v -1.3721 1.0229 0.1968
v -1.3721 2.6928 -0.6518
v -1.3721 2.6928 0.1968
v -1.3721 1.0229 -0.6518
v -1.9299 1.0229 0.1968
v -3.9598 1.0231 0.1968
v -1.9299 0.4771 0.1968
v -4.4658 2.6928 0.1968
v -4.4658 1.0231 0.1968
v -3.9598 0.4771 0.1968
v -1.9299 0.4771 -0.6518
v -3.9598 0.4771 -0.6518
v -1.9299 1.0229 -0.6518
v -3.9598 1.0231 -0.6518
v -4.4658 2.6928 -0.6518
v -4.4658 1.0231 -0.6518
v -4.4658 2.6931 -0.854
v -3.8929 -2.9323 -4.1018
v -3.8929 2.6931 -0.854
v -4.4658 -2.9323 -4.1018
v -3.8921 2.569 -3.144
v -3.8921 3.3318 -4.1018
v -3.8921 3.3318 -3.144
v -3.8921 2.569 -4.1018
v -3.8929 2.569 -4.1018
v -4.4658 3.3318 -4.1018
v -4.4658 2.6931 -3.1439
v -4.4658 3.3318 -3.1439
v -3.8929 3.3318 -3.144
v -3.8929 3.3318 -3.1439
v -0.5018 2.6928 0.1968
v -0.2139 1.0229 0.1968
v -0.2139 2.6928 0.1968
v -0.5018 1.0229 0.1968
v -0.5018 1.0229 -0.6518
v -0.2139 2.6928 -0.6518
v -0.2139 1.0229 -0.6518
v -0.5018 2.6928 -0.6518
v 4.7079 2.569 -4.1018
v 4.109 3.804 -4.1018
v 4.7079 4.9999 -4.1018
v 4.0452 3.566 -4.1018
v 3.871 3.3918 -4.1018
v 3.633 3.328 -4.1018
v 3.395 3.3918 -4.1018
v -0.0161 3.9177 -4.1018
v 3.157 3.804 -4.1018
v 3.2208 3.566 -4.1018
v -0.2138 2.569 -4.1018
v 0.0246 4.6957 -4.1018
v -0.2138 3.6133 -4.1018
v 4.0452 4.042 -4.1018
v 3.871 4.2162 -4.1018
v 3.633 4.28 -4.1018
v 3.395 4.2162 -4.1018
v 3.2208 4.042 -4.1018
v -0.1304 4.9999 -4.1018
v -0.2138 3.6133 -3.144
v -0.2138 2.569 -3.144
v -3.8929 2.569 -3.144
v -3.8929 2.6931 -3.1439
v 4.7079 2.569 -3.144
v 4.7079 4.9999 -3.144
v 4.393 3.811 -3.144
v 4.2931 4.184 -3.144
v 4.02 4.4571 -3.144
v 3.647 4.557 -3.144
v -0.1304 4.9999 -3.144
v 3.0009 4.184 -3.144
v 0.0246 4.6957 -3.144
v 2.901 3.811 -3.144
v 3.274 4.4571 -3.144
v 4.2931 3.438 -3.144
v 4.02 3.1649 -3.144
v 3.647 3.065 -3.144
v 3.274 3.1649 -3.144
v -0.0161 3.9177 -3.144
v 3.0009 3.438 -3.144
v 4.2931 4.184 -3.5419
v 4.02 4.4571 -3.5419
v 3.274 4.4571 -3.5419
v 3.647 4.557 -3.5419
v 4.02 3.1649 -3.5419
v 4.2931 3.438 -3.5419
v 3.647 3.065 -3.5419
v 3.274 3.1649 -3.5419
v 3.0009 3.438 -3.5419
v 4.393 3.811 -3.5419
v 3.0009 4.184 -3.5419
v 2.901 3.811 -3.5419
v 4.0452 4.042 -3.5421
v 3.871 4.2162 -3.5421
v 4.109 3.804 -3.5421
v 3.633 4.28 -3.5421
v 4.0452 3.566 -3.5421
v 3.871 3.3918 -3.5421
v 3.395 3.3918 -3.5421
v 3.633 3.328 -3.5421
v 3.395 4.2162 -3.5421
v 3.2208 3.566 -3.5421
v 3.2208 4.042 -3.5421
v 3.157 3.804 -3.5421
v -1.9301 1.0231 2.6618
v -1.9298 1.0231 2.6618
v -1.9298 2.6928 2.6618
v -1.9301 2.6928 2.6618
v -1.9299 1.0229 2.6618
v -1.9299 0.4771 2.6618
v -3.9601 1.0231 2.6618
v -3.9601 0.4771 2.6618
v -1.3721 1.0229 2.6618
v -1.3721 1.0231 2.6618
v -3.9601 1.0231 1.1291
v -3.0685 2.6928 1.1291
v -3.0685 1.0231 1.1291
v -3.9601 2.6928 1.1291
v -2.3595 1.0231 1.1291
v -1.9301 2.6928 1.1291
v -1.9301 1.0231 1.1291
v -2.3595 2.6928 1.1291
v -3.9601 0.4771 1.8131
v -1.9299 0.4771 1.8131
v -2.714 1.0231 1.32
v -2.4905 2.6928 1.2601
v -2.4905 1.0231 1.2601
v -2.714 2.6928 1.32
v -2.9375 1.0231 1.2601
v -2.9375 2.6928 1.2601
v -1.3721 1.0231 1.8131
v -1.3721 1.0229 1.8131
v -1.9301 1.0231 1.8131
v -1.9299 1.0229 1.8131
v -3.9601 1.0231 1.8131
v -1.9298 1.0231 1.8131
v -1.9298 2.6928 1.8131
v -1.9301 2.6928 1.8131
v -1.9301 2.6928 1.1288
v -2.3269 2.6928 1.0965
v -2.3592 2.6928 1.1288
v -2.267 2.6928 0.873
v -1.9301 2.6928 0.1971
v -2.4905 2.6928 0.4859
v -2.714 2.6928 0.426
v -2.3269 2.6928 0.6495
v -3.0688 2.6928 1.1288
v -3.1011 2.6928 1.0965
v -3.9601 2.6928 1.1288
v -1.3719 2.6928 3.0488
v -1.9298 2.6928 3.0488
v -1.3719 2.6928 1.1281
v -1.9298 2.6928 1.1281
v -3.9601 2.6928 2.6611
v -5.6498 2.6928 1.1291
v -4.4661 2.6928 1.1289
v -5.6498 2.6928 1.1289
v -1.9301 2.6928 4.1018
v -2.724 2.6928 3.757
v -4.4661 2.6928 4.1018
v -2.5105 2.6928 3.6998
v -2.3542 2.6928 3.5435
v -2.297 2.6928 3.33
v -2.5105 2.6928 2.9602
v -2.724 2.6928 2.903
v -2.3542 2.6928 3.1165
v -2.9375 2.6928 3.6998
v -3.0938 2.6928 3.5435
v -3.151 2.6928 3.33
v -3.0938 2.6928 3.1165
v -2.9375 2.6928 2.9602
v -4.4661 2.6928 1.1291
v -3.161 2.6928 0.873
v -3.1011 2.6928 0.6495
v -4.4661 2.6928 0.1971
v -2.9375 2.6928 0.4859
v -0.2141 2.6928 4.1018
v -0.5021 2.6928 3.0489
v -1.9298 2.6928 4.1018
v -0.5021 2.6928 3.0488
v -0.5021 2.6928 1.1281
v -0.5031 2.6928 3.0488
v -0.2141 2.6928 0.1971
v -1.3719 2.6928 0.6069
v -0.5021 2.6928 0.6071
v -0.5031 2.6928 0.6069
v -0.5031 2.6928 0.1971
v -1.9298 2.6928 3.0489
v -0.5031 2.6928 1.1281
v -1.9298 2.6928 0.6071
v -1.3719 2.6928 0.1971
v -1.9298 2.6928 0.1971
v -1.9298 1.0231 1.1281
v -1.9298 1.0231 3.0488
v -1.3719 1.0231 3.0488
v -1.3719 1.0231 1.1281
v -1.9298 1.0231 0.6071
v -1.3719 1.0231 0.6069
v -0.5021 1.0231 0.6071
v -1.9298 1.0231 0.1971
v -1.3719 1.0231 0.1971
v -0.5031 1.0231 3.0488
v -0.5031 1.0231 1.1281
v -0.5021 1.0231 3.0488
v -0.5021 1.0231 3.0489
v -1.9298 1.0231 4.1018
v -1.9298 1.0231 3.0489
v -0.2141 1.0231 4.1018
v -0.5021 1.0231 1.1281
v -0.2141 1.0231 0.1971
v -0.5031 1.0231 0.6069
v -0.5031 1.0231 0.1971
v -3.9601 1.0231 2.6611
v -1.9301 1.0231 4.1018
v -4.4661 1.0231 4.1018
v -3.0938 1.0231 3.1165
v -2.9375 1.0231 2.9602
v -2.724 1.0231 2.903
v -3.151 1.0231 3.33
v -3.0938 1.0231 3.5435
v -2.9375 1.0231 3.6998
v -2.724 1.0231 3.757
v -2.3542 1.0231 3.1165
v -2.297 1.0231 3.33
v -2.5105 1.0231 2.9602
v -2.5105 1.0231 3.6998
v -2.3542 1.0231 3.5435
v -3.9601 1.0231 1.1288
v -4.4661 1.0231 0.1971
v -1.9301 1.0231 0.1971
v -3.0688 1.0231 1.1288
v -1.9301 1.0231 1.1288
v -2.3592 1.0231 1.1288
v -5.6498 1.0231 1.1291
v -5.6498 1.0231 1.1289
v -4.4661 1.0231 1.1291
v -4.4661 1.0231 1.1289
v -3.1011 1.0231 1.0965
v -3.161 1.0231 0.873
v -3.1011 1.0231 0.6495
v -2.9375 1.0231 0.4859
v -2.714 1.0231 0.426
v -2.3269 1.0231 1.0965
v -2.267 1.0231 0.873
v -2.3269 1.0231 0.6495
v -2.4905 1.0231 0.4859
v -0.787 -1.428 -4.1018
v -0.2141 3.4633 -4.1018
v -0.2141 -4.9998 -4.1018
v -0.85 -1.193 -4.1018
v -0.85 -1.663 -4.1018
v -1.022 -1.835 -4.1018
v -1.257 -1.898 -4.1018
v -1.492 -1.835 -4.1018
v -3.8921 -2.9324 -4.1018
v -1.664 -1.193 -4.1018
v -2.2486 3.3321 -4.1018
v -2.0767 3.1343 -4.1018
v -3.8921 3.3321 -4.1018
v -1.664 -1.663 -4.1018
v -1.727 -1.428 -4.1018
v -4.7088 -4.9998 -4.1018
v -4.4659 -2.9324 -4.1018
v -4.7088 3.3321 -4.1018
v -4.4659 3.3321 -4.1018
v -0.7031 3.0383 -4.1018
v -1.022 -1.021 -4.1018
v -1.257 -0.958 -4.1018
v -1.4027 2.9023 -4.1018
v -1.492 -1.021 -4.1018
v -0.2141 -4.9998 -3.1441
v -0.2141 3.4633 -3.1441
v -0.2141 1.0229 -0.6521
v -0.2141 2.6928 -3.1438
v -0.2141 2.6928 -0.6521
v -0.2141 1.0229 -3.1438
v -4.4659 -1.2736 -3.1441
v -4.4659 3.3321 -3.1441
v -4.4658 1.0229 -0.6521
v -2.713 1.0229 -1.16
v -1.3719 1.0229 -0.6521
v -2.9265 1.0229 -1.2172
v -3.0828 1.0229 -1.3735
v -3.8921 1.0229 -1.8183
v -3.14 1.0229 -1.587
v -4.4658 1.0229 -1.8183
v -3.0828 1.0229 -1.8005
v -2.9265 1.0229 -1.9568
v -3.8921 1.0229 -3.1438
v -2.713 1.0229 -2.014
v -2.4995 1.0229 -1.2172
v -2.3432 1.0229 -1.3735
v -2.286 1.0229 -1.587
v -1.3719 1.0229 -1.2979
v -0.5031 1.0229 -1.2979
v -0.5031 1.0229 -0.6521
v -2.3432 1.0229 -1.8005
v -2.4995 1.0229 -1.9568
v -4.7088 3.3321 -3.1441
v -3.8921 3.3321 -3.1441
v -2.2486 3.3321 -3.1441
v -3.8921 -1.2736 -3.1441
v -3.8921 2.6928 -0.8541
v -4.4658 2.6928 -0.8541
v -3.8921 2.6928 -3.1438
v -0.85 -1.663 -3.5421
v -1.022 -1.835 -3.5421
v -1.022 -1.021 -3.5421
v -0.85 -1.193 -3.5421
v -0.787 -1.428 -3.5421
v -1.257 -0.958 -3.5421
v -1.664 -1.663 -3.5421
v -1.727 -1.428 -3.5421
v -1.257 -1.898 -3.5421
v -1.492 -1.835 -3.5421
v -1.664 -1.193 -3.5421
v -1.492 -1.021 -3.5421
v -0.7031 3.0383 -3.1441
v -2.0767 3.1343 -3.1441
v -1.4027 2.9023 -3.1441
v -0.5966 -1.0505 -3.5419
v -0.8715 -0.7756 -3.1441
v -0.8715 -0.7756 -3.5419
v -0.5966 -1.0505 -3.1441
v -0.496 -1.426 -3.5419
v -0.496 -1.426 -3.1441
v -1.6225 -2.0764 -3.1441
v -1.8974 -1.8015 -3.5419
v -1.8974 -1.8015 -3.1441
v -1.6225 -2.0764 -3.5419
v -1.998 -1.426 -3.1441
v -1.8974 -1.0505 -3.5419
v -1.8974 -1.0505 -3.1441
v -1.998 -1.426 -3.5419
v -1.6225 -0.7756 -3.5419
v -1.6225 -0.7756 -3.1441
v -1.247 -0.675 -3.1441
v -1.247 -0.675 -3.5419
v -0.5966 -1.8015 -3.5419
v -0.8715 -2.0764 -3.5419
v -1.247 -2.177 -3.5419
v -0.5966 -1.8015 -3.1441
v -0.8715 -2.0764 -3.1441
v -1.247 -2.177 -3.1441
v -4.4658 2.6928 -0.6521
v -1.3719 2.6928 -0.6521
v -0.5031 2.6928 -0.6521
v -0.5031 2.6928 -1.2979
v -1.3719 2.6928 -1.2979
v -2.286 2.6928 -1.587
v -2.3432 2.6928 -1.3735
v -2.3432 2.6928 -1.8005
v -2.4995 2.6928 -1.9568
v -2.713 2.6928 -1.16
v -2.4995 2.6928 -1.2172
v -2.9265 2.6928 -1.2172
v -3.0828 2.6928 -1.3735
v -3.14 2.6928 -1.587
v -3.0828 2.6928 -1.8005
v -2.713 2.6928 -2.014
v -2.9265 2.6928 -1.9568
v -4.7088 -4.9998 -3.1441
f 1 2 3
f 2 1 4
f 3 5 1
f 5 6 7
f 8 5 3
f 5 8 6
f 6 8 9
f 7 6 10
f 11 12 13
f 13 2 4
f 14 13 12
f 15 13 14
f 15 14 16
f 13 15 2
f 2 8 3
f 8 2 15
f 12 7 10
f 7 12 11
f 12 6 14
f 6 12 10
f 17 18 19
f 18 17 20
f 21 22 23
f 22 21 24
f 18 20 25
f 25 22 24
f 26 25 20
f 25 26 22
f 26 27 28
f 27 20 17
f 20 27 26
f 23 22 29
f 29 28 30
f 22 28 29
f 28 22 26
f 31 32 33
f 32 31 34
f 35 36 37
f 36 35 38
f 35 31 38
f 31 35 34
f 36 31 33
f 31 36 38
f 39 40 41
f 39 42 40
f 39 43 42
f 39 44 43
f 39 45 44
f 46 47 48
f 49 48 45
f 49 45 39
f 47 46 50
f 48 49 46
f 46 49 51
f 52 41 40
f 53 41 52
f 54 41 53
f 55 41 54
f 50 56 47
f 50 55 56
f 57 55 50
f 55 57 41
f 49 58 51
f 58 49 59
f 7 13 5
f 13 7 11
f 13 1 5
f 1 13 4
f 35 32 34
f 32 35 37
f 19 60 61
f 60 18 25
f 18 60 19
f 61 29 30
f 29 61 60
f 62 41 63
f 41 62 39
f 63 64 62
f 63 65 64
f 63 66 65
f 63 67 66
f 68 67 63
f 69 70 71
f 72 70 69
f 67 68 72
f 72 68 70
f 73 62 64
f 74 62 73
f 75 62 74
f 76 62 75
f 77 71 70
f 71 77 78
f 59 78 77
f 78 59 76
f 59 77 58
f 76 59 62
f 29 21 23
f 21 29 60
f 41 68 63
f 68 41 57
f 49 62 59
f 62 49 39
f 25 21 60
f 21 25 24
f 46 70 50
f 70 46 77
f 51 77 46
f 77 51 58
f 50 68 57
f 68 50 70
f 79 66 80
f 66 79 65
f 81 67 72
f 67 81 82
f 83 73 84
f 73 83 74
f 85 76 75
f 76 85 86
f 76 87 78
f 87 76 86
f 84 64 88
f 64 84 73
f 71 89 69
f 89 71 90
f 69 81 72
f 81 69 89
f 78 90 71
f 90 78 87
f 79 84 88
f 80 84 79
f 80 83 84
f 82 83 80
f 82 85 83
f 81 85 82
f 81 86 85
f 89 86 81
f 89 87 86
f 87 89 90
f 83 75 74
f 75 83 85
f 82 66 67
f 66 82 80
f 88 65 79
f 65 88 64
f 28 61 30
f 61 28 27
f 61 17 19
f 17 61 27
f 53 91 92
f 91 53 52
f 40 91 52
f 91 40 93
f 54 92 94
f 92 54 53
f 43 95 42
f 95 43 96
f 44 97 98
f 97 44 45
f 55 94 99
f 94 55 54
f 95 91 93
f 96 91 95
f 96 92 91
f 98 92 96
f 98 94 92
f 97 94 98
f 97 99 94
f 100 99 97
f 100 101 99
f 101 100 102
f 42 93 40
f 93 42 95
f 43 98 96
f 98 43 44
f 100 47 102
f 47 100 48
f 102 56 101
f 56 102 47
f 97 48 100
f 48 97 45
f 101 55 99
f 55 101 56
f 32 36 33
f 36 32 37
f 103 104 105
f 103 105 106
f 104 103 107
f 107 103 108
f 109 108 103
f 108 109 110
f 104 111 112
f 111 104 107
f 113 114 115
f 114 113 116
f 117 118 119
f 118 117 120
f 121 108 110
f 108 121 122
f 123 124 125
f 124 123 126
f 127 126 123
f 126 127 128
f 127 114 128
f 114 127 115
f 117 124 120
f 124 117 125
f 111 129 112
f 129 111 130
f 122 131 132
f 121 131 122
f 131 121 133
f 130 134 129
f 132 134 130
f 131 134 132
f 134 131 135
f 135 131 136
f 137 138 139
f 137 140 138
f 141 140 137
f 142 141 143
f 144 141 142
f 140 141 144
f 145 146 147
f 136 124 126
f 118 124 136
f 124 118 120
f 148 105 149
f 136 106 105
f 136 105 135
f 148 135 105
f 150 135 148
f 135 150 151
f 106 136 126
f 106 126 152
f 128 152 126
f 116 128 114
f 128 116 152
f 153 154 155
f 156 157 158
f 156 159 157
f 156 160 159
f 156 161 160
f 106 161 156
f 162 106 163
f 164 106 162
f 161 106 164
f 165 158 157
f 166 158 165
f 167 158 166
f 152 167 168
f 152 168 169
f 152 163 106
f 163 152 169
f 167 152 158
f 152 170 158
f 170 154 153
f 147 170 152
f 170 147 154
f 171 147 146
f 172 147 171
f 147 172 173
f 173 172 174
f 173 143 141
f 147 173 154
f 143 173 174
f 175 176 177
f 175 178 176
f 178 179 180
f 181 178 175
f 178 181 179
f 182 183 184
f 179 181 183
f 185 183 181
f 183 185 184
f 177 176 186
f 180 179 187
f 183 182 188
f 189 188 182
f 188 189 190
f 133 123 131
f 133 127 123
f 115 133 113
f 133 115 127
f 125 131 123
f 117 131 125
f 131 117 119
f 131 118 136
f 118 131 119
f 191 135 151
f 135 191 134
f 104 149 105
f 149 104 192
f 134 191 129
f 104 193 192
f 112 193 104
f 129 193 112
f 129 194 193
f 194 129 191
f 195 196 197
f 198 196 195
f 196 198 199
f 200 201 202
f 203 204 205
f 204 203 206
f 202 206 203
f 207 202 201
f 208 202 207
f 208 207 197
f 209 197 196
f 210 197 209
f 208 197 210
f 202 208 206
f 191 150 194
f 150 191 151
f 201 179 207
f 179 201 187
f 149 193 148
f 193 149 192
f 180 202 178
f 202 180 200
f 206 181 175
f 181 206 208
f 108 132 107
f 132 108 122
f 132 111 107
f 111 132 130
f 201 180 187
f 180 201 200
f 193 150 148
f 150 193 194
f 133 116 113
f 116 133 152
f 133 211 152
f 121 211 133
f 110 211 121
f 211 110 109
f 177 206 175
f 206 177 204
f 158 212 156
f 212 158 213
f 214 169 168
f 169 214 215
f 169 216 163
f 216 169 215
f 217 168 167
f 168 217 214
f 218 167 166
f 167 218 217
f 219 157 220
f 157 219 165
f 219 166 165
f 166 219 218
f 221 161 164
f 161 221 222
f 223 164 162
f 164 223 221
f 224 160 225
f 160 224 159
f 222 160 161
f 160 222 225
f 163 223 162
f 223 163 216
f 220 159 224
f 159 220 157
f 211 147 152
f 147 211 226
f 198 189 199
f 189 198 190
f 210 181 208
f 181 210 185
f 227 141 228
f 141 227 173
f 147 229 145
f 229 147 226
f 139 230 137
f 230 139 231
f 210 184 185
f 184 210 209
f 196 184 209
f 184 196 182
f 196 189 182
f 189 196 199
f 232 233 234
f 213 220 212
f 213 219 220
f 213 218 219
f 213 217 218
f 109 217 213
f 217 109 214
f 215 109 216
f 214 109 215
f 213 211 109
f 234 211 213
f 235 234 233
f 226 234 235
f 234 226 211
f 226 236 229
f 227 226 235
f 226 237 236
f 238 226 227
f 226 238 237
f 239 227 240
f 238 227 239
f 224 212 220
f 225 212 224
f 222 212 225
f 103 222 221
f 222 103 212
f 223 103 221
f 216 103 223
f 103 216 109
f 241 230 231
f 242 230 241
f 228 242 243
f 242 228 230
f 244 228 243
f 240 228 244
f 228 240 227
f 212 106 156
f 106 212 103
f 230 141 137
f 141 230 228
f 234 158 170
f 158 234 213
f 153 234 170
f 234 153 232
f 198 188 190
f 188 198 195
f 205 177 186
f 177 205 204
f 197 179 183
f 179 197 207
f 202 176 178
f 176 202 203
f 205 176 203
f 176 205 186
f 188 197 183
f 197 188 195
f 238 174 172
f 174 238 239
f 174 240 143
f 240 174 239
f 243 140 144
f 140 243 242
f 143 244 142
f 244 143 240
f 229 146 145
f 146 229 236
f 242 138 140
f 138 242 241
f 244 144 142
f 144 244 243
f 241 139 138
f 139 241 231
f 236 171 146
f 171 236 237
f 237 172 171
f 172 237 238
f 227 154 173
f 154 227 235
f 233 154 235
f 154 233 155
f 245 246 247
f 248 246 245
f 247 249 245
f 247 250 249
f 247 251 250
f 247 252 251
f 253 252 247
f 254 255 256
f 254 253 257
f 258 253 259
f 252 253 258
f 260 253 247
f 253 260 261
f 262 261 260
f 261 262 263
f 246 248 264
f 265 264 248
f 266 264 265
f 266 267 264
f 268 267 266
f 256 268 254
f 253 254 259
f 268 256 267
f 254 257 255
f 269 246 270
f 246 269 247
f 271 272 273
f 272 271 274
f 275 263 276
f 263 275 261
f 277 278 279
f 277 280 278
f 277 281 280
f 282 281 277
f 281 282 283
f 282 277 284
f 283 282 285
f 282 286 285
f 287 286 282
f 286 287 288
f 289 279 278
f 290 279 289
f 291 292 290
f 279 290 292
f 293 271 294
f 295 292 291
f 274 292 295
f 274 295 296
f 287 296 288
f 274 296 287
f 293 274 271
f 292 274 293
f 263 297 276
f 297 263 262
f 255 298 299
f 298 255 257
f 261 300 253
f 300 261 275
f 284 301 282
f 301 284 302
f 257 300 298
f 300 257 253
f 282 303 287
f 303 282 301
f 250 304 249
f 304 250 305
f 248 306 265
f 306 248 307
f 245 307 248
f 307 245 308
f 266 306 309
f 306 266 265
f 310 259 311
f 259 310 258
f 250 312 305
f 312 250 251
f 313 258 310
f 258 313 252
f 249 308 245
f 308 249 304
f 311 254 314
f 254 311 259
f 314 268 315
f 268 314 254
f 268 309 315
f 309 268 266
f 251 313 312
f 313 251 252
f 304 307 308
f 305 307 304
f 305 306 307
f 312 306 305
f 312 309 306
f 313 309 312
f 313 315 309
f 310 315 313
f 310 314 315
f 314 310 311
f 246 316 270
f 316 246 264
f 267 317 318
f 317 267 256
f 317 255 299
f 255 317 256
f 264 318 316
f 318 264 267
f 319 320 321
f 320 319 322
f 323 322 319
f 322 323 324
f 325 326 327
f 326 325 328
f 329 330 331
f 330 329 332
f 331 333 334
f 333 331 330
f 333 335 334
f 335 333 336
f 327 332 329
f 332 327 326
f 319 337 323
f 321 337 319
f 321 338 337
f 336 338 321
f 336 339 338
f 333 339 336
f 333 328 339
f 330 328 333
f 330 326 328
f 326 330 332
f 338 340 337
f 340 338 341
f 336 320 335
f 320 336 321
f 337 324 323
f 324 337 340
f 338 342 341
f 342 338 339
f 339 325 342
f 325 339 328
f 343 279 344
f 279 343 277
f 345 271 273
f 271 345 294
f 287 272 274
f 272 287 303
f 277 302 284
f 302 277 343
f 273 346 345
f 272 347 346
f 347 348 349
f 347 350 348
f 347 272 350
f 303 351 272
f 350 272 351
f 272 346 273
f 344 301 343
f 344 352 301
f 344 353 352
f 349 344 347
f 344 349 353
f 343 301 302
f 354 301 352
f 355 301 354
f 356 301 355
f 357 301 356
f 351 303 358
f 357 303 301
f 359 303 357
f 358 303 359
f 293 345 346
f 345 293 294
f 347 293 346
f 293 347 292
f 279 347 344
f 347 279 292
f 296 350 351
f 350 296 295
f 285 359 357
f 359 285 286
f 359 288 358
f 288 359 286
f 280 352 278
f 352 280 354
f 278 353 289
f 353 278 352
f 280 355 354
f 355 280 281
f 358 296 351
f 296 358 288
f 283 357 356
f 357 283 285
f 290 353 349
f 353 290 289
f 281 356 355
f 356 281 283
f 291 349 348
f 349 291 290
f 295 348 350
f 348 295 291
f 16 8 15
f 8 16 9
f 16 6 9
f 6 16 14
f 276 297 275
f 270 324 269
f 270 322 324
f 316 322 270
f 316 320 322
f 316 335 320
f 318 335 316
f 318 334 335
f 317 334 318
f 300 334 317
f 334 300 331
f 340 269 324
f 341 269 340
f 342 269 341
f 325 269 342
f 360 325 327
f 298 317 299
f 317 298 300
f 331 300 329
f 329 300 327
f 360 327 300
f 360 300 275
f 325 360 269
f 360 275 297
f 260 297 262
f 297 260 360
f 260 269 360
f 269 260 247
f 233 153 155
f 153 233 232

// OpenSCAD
intersection() {
  translate([0.0005, 0, 0])
  cube(size = [11.3007, 11.9997, 9.8457], center = true);

  union() {
    difference() {
      union() {
        translate([2.1035, -1.1535, -0.2275])
        cube(size = [5.2107, 7.6927, 0.8487], center = true);
      
        intersection() {
          translate([-9.786, 1.585, -0.2275])
          cube(size = [16.8277, 2.2157, 0.8487], center = true);
        
          translate([7.12, 0, 0])
          rotate([90, 0, 0])
          cube(size = [22.1597, 36.3997, 36.3997], center = true);
        }
      
        translate([8.993, 0, -2.7])
        rotate([-180, 0, 0])
        cube(size = [18.4137, 36.3997, 2.8037], center = true);
      
        intersection() {
          translate([-9.207, 5.0715, -8.7841])
          rotate([-150, 0, 0])
          cube(size = [17.9857, 36.3997, 16.1137], center = true);
        
          translate([-4.179, -0.834, -2.377])
          cube(size = [0.5737, 8.3317, 3.4497], center = true);
        }
      
        translate([-1.247, -1.426, -11.151])
        cylinder(h = 14.0977, r1 = 0.751, r2 = 0.751, center = true, $fn = 12);
      }
    
      union() {
        translate([3.647, 3.811, 7.329])
        rotate([180, 0, 180])
        cylinder(h = 21.7418, r1 = 0.746, r2 = 0.746, center = true, $fn = 12);
      
        translate([6.867, 3.0125, -1.898])
        cube(size = [22.6658, 0.6388, 2.4918], center = true);
      
        translate([3.633, 3.804, -3.822])
        cylinder(h = 0.5598, r1 = 0.476, r2 = 0.476, center = true, $fn = 12);
      
        difference() {
          union() {
            translate([8.135, -8.588, 0])
            rotate([90, 0, 0])
            cube(size = [20.1298, 36.3998, 19.2218], center = true);
          
            translate([7.1535, 5.0715, -8.7841])
            rotate([30, 0, 0])
            cube(size = [22.0928, 36.3998, 16.1138], center = true);
          }
        
          difference() {
            translate([0.4075, 3.7845, -10.672])
            cube(size = [8.6009, 2.4309, 15.0559], center = true);
          
            translate([-1.44748, 4.38281, 0])
            rotate([0, 0, 72])
            cylinder(h = 36.4, r1 = 1.505, r2 = 1.505, center = true, $fn = 12);
          }
        }
      
        translate([8.993, 0, -1.4735])
        rotate([-180, 0, 0])
        cube(size = [18.4138, 36.3998, 3.3408], center = true);
      }
    }
  
    difference() {
      union() {
        intersection() {
          difference() {
            translate([-2.9185, 9.3385, 1.8955])
            cube(size = [3.0947, 17.7227, 1.5327], center = true);
          
            translate([-2.714, 0, 0.873])
            rotate([180, 90, -90])
            cylinder(h = 36.3998, r1 = 0.447, r2 = 0.447, center = true, $fn = 12);
          }
        
          union() {
            translate([-9.786, 1.585, 2.4315])
            cube(size = [16.8277, 2.2157, 1.2367], center = true);
          
            translate([-10.065, 1.858, 0])
            rotate([90, 0, 0])
            cube(size = [16.2697, 36.3997, 1.6697], center = true);
          }
        }
      
        intersection() {
          sphere(r = 54.5997, $fn = 109);
        
          translate([-2.714, -8.8615, 0.873])
          rotate([180, 90, -90])
          cylinder(h = 18.6767, r1 = 0.447, r2 = 0.447, center = true, $fn = 12);
        }
      
        intersection() {
          translate([8.135, 1.858, 0])
          rotate([90, 0, 0])
          cube(size = [20.1297, 36.3997, 1.6697], center = true);
        
          translate([-9.207, 0, 2.0885])
          rotate([180, 0, 0])
          cube(size = [17.9857, 36.3997, 1.9207], center = true);
        }
      }
    
      intersection() {
        union() {
          translate([8.135, -8.588, 0])
          rotate([90, 0, 0])
          cube(size = [20.1298, 36.3998, 19.2218], center = true);
        
          translate([0, -8.8615, 0])
          rotate([90, 0, 0])
          cube(size = [36.3998, 36.3998, 18.6768], center = true);
        
          translate([-0.9375, 0, 1.6235])
          cube(size = [0.8688, 36.3998, 2.8528], center = true);
        
          translate([-11.08, 0, 0])
          rotate([90, 0, 0])
          cube(size = [14.2398, 36.3998, 36.3998], center = true);
        }
      
        sphere(r = 54.5998, $fn = 109);
      }
    }
  
    intersection() {
      union() {
        intersection() {
          difference() {
            translate([-9.207, 0, 3.3815])
            rotate([180, 0, 0])
            cube(size = [17.9857, 36.3997, 1.4407], center = true);
          
            translate([-2.724, 0, 3.33])
            rotate([0, 90, 90])
            cylinder(h = 36.3998, r1 = 0.427, r2 = 0.427, center = true, $fn = 12);
          }
        
          union() {
            translate([-2.9185, 1.585, -8.1935])
            cube(size = [3.0947, 2.2157, 20.0127], center = true);
          
            rotate([90, 0, 0])
            cube(size = [36.3997, 36.3997, 36.3997], center = true);
          }
        }
      
        intersection() {
          translate([-11.08, 0, 0])
          rotate([90, 0, 0])
          cube(size = [14.2397, 36.3997, 36.3997], center = true);
        
          translate([-9.207, 0, 2.0885])
          rotate([180, 0, 0])
          cube(size = [17.9857, 36.3997, 1.9207], center = true);
        }
      
        difference() {
          translate([-9.207, 0, 0.663])
          rotate([180, 0, 0])
          cube(size = [17.9857, 36.3997, 0.9317], center = true);
        
          translate([-0.9375, 0, 0.402])
          cube(size = [0.8688, 36.3998, 0.4098], center = true);
        }
      }
    
      difference() {
        union() {
          difference() {
            translate([-10.065, 1.858, 0])
            rotate([90, 0, 0])
            cube(size = [16.2697, 36.3997, 1.6697], center = true);
          
            translate([-11.333, -7.7535, 9.6645])
            cube(size = [13.7338, 20.8928, 17.0708], center = true);
          }
        
          translate([8.135, 1.858, 0])
          rotate([90, 0, 0])
          cube(size = [20.1297, 36.3997, 1.6697], center = true);
        }
      
        union() {
          translate([-2.714, -7.7535, 0.873])
          rotate([180, 90, -90])
          cylinder(h = 20.8928, r1 = 0.447, r2 = 0.447, center = true, $fn = 12);
        
          translate([-11.333, 1.585, 0.663])
          cube(size = [13.7338, 2.2158, 0.9318], center = true);
        
          difference() {
            translate([-9.351, 9.6115, 1.828])
            cube(size = [17.6978, 17.1768, 2.4418], center = true);
          
            translate([-10.065, 0, 0])
            rotate([90, 0, 0])
            cube(size = [16.2699, 36.3999, 36.3999], center = true);
          }
        }
      }
    }
  
    intersection() {
      difference() {
        difference() {
          intersection() {
            translate([-9.207, 0, -1.9525])
            rotate([-180, 0, 0])
            cube(size = [17.9857, 36.3997, 4.2987], center = true);
          
            translate([-6.7455, -6.6, 7.049])
            cube(size = [22.9087, 23.1997, 22.3017], center = true);
          }
        
          union() {
            translate([0.1215, 0.75, -1.4735])
            cube(size = [9.1748, 0.5458, 3.3408], center = true);
          
            translate([-2.606, 4.166, -2.7])
            cube(size = [4.2058, 1.6678, 2.8038], center = true);
          }
        }
      
        union() {
          translate([-4.179, 5.0715, -8.7841])
          rotate([30, 0, 0])
          cube(size = [0.5738, 36.3998, 16.1138], center = true);
        
          translate([-1.257, -1.428, -10.871])
          cylinder(h = 14.6578, r1 = 0.47, r2 = 0.47, center = true, $fn = 12);
        
          translate([-1.30669, 4.27593, 0])
          rotate([0, 0, -64])
          cylinder(h = 36.3998, r1 = 1.377, r2 = 1.377, center = true, $fn = 12);
        
          translate([-1.247, -1.426, -3.343])
          cylinder(h = 0.3978, r1 = 0.751, r2 = 0.751, center = true, $fn = 12);
        }
      }
    
      union() {
        translate([-4.179, 1.858, 8.774])
        cube(size = [0.5737, 1.6697, 18.8517], center = true);
      
        translate([6.7455, 6.6, -3.623])
        cube(size = [22.9087, 23.1997, 0.9577], center = true);
      
        difference() {
          difference() {
            translate([0.1215, 1.585, -1.898])
            cube(size = [9.1747, 2.2157, 2.4917], center = true);
          
            translate([-0.9375, 2.7385, -0.975])
            cube(size = [0.8688, 4.5228, 0.6458], center = true);
          }
        
          translate([-2.713, 0, -1.587])
          rotate([180, 90, -90])
          cylinder(h = 36.3998, r1 = 0.427, r2 = 0.427, center = true, $fn = 12);
        }
      }
    }
  }
}
